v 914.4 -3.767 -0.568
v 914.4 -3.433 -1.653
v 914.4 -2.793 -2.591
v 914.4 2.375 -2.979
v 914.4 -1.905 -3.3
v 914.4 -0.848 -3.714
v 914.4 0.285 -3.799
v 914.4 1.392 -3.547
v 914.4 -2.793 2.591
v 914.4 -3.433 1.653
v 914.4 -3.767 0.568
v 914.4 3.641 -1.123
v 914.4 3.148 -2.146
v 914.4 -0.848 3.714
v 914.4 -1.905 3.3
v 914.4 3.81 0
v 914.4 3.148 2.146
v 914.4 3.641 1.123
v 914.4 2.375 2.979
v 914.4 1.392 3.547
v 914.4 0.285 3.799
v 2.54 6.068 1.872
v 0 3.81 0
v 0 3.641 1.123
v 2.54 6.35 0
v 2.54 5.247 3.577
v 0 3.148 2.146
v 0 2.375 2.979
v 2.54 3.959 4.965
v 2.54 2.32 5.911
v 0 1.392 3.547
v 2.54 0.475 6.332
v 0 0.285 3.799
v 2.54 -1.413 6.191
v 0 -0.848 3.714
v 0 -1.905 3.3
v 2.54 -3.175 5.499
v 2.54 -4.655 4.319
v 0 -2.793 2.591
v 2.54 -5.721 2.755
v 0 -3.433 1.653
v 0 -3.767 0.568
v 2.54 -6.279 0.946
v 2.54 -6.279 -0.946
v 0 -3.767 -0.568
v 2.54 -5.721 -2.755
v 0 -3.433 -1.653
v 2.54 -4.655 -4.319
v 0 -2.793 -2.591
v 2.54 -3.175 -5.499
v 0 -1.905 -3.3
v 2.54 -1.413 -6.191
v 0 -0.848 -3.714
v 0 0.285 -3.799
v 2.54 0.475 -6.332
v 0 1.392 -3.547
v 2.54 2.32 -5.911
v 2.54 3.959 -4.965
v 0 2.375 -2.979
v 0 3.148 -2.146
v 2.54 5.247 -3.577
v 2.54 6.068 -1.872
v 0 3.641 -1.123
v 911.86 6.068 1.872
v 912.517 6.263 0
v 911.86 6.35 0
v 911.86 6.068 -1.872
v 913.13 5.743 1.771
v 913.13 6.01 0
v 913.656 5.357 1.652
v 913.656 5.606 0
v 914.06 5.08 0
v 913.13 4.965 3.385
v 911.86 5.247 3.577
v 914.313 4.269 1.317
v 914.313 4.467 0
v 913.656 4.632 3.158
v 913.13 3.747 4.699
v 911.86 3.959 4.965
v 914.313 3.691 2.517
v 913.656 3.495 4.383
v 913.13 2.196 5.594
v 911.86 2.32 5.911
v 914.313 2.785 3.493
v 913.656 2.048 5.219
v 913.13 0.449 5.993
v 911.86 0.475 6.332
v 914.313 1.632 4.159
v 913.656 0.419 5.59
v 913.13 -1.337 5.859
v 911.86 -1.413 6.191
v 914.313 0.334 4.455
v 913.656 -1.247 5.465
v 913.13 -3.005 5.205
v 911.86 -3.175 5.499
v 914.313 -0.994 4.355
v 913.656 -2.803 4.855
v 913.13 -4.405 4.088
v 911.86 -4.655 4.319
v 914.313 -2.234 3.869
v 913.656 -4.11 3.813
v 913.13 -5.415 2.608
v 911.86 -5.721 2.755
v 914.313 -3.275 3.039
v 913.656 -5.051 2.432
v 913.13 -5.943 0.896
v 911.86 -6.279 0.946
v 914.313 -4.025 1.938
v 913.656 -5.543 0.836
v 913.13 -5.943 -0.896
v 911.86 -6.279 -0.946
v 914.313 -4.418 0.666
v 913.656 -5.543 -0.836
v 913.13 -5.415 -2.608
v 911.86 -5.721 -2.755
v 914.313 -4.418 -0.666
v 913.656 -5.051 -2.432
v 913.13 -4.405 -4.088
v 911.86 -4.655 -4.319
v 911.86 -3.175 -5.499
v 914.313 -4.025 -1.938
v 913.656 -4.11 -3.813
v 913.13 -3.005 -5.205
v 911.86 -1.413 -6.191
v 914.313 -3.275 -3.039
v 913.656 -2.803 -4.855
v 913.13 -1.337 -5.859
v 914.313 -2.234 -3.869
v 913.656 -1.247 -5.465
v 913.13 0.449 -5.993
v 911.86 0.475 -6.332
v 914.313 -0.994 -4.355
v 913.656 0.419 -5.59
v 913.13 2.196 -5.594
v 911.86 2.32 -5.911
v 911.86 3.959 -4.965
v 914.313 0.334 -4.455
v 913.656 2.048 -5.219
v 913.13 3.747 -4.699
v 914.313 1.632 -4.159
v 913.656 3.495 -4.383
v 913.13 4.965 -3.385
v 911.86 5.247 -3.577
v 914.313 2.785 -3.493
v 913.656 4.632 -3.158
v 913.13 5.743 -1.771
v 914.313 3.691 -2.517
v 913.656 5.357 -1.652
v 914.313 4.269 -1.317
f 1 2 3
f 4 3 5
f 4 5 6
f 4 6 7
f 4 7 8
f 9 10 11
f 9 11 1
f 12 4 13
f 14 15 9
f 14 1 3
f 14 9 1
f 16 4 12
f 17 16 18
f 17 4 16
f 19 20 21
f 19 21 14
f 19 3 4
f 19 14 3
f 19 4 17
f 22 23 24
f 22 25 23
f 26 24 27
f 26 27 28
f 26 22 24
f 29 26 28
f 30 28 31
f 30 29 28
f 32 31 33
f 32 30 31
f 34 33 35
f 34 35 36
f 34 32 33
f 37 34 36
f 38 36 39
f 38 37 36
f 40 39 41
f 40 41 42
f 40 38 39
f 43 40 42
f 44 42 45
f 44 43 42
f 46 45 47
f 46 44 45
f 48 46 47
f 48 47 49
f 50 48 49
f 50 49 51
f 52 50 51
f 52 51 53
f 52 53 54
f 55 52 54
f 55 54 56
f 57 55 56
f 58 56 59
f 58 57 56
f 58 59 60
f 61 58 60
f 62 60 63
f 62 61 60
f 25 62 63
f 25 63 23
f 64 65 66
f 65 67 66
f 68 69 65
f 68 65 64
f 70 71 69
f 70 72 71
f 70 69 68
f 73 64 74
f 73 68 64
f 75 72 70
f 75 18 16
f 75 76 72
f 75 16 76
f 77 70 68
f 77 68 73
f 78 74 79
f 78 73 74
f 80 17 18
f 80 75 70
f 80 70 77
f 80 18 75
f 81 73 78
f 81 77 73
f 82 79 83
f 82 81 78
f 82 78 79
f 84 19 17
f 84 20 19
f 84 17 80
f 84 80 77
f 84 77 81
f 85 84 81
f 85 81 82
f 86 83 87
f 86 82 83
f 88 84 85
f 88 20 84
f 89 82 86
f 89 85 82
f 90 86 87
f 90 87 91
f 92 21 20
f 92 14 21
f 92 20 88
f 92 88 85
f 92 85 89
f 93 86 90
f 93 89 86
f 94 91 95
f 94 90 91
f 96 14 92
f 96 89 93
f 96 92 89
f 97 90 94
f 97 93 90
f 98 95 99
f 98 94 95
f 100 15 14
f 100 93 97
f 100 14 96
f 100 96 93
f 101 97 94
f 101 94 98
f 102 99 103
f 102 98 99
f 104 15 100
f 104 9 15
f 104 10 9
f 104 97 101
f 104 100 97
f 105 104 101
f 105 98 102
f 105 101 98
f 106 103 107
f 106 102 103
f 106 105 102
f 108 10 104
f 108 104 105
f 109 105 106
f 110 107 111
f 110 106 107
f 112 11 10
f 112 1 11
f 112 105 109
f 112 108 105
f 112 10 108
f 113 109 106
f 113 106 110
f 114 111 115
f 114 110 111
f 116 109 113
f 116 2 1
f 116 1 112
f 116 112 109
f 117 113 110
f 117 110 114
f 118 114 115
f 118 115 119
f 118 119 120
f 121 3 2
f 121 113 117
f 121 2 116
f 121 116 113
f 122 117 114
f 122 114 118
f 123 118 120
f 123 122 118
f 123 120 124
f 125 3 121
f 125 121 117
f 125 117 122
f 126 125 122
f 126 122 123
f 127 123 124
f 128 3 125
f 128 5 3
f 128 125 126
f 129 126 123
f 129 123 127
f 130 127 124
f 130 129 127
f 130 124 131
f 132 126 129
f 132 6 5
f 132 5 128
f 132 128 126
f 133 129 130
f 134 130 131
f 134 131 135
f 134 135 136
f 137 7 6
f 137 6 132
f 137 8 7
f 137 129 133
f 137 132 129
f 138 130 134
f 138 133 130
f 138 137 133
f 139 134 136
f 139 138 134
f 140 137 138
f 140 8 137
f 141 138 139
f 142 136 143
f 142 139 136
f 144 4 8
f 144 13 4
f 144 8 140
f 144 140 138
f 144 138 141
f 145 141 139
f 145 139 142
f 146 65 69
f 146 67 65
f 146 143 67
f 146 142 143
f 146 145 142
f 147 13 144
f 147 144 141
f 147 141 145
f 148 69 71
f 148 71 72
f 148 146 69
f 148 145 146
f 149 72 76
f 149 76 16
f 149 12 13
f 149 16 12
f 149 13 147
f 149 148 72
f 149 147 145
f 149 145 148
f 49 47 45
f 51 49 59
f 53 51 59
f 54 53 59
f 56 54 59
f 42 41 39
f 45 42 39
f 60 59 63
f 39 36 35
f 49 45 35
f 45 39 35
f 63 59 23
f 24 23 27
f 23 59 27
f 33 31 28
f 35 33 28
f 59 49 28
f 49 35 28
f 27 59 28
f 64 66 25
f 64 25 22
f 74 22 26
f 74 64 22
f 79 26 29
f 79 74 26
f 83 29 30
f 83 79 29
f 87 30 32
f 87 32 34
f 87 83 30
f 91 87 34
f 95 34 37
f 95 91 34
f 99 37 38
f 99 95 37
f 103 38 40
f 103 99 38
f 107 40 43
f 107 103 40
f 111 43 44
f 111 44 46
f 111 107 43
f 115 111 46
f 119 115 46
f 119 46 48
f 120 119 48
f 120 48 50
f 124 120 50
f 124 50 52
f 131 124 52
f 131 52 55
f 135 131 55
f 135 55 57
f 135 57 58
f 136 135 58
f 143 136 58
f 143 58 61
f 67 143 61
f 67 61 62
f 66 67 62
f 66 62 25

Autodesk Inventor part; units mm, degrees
ref_plane "Start Plane" through (0, 0, 0) normal (1, 0, 0) x (0, 1, 0)
ref_plane "XZ Plane" through (0, 0, 0) normal (0, 1, 0) x (-1, 0, 0)
ref_plane "XY Plane" through (0, 0, 0) normal (0, 0, 1) x (1, 0, 0)
sketch "Main Sketch" plane through (0, 0, 0) normal (0, 0, 1) x (1, 0, 0)
  line L0 (0, 0) -> (914.4, 0)
  line L1 (0, 0) -> (0, 6.35)
  line L2 (914.4, 6.35) -> (914.4, 0)
  line L3 (0, 6.35) -> (914.4, 6.35)
  dimension "d3" = 12.7
revolve "Revolution1" add sketch "Main Sketch" angle 360 about axis through (0, 0, 0) along (1, 0, 0)
chamfer "Chamfer1" distance 2.54 angle 45 1 edges at (0, -6.35, 0) measured on face at (609.6, 6.3294, -0.511)
fillet "Fillet1" radius 2.54 1 edges at (914.4, -6.35, 0)
properties part number "Shaft" material "Steel, Mild"
